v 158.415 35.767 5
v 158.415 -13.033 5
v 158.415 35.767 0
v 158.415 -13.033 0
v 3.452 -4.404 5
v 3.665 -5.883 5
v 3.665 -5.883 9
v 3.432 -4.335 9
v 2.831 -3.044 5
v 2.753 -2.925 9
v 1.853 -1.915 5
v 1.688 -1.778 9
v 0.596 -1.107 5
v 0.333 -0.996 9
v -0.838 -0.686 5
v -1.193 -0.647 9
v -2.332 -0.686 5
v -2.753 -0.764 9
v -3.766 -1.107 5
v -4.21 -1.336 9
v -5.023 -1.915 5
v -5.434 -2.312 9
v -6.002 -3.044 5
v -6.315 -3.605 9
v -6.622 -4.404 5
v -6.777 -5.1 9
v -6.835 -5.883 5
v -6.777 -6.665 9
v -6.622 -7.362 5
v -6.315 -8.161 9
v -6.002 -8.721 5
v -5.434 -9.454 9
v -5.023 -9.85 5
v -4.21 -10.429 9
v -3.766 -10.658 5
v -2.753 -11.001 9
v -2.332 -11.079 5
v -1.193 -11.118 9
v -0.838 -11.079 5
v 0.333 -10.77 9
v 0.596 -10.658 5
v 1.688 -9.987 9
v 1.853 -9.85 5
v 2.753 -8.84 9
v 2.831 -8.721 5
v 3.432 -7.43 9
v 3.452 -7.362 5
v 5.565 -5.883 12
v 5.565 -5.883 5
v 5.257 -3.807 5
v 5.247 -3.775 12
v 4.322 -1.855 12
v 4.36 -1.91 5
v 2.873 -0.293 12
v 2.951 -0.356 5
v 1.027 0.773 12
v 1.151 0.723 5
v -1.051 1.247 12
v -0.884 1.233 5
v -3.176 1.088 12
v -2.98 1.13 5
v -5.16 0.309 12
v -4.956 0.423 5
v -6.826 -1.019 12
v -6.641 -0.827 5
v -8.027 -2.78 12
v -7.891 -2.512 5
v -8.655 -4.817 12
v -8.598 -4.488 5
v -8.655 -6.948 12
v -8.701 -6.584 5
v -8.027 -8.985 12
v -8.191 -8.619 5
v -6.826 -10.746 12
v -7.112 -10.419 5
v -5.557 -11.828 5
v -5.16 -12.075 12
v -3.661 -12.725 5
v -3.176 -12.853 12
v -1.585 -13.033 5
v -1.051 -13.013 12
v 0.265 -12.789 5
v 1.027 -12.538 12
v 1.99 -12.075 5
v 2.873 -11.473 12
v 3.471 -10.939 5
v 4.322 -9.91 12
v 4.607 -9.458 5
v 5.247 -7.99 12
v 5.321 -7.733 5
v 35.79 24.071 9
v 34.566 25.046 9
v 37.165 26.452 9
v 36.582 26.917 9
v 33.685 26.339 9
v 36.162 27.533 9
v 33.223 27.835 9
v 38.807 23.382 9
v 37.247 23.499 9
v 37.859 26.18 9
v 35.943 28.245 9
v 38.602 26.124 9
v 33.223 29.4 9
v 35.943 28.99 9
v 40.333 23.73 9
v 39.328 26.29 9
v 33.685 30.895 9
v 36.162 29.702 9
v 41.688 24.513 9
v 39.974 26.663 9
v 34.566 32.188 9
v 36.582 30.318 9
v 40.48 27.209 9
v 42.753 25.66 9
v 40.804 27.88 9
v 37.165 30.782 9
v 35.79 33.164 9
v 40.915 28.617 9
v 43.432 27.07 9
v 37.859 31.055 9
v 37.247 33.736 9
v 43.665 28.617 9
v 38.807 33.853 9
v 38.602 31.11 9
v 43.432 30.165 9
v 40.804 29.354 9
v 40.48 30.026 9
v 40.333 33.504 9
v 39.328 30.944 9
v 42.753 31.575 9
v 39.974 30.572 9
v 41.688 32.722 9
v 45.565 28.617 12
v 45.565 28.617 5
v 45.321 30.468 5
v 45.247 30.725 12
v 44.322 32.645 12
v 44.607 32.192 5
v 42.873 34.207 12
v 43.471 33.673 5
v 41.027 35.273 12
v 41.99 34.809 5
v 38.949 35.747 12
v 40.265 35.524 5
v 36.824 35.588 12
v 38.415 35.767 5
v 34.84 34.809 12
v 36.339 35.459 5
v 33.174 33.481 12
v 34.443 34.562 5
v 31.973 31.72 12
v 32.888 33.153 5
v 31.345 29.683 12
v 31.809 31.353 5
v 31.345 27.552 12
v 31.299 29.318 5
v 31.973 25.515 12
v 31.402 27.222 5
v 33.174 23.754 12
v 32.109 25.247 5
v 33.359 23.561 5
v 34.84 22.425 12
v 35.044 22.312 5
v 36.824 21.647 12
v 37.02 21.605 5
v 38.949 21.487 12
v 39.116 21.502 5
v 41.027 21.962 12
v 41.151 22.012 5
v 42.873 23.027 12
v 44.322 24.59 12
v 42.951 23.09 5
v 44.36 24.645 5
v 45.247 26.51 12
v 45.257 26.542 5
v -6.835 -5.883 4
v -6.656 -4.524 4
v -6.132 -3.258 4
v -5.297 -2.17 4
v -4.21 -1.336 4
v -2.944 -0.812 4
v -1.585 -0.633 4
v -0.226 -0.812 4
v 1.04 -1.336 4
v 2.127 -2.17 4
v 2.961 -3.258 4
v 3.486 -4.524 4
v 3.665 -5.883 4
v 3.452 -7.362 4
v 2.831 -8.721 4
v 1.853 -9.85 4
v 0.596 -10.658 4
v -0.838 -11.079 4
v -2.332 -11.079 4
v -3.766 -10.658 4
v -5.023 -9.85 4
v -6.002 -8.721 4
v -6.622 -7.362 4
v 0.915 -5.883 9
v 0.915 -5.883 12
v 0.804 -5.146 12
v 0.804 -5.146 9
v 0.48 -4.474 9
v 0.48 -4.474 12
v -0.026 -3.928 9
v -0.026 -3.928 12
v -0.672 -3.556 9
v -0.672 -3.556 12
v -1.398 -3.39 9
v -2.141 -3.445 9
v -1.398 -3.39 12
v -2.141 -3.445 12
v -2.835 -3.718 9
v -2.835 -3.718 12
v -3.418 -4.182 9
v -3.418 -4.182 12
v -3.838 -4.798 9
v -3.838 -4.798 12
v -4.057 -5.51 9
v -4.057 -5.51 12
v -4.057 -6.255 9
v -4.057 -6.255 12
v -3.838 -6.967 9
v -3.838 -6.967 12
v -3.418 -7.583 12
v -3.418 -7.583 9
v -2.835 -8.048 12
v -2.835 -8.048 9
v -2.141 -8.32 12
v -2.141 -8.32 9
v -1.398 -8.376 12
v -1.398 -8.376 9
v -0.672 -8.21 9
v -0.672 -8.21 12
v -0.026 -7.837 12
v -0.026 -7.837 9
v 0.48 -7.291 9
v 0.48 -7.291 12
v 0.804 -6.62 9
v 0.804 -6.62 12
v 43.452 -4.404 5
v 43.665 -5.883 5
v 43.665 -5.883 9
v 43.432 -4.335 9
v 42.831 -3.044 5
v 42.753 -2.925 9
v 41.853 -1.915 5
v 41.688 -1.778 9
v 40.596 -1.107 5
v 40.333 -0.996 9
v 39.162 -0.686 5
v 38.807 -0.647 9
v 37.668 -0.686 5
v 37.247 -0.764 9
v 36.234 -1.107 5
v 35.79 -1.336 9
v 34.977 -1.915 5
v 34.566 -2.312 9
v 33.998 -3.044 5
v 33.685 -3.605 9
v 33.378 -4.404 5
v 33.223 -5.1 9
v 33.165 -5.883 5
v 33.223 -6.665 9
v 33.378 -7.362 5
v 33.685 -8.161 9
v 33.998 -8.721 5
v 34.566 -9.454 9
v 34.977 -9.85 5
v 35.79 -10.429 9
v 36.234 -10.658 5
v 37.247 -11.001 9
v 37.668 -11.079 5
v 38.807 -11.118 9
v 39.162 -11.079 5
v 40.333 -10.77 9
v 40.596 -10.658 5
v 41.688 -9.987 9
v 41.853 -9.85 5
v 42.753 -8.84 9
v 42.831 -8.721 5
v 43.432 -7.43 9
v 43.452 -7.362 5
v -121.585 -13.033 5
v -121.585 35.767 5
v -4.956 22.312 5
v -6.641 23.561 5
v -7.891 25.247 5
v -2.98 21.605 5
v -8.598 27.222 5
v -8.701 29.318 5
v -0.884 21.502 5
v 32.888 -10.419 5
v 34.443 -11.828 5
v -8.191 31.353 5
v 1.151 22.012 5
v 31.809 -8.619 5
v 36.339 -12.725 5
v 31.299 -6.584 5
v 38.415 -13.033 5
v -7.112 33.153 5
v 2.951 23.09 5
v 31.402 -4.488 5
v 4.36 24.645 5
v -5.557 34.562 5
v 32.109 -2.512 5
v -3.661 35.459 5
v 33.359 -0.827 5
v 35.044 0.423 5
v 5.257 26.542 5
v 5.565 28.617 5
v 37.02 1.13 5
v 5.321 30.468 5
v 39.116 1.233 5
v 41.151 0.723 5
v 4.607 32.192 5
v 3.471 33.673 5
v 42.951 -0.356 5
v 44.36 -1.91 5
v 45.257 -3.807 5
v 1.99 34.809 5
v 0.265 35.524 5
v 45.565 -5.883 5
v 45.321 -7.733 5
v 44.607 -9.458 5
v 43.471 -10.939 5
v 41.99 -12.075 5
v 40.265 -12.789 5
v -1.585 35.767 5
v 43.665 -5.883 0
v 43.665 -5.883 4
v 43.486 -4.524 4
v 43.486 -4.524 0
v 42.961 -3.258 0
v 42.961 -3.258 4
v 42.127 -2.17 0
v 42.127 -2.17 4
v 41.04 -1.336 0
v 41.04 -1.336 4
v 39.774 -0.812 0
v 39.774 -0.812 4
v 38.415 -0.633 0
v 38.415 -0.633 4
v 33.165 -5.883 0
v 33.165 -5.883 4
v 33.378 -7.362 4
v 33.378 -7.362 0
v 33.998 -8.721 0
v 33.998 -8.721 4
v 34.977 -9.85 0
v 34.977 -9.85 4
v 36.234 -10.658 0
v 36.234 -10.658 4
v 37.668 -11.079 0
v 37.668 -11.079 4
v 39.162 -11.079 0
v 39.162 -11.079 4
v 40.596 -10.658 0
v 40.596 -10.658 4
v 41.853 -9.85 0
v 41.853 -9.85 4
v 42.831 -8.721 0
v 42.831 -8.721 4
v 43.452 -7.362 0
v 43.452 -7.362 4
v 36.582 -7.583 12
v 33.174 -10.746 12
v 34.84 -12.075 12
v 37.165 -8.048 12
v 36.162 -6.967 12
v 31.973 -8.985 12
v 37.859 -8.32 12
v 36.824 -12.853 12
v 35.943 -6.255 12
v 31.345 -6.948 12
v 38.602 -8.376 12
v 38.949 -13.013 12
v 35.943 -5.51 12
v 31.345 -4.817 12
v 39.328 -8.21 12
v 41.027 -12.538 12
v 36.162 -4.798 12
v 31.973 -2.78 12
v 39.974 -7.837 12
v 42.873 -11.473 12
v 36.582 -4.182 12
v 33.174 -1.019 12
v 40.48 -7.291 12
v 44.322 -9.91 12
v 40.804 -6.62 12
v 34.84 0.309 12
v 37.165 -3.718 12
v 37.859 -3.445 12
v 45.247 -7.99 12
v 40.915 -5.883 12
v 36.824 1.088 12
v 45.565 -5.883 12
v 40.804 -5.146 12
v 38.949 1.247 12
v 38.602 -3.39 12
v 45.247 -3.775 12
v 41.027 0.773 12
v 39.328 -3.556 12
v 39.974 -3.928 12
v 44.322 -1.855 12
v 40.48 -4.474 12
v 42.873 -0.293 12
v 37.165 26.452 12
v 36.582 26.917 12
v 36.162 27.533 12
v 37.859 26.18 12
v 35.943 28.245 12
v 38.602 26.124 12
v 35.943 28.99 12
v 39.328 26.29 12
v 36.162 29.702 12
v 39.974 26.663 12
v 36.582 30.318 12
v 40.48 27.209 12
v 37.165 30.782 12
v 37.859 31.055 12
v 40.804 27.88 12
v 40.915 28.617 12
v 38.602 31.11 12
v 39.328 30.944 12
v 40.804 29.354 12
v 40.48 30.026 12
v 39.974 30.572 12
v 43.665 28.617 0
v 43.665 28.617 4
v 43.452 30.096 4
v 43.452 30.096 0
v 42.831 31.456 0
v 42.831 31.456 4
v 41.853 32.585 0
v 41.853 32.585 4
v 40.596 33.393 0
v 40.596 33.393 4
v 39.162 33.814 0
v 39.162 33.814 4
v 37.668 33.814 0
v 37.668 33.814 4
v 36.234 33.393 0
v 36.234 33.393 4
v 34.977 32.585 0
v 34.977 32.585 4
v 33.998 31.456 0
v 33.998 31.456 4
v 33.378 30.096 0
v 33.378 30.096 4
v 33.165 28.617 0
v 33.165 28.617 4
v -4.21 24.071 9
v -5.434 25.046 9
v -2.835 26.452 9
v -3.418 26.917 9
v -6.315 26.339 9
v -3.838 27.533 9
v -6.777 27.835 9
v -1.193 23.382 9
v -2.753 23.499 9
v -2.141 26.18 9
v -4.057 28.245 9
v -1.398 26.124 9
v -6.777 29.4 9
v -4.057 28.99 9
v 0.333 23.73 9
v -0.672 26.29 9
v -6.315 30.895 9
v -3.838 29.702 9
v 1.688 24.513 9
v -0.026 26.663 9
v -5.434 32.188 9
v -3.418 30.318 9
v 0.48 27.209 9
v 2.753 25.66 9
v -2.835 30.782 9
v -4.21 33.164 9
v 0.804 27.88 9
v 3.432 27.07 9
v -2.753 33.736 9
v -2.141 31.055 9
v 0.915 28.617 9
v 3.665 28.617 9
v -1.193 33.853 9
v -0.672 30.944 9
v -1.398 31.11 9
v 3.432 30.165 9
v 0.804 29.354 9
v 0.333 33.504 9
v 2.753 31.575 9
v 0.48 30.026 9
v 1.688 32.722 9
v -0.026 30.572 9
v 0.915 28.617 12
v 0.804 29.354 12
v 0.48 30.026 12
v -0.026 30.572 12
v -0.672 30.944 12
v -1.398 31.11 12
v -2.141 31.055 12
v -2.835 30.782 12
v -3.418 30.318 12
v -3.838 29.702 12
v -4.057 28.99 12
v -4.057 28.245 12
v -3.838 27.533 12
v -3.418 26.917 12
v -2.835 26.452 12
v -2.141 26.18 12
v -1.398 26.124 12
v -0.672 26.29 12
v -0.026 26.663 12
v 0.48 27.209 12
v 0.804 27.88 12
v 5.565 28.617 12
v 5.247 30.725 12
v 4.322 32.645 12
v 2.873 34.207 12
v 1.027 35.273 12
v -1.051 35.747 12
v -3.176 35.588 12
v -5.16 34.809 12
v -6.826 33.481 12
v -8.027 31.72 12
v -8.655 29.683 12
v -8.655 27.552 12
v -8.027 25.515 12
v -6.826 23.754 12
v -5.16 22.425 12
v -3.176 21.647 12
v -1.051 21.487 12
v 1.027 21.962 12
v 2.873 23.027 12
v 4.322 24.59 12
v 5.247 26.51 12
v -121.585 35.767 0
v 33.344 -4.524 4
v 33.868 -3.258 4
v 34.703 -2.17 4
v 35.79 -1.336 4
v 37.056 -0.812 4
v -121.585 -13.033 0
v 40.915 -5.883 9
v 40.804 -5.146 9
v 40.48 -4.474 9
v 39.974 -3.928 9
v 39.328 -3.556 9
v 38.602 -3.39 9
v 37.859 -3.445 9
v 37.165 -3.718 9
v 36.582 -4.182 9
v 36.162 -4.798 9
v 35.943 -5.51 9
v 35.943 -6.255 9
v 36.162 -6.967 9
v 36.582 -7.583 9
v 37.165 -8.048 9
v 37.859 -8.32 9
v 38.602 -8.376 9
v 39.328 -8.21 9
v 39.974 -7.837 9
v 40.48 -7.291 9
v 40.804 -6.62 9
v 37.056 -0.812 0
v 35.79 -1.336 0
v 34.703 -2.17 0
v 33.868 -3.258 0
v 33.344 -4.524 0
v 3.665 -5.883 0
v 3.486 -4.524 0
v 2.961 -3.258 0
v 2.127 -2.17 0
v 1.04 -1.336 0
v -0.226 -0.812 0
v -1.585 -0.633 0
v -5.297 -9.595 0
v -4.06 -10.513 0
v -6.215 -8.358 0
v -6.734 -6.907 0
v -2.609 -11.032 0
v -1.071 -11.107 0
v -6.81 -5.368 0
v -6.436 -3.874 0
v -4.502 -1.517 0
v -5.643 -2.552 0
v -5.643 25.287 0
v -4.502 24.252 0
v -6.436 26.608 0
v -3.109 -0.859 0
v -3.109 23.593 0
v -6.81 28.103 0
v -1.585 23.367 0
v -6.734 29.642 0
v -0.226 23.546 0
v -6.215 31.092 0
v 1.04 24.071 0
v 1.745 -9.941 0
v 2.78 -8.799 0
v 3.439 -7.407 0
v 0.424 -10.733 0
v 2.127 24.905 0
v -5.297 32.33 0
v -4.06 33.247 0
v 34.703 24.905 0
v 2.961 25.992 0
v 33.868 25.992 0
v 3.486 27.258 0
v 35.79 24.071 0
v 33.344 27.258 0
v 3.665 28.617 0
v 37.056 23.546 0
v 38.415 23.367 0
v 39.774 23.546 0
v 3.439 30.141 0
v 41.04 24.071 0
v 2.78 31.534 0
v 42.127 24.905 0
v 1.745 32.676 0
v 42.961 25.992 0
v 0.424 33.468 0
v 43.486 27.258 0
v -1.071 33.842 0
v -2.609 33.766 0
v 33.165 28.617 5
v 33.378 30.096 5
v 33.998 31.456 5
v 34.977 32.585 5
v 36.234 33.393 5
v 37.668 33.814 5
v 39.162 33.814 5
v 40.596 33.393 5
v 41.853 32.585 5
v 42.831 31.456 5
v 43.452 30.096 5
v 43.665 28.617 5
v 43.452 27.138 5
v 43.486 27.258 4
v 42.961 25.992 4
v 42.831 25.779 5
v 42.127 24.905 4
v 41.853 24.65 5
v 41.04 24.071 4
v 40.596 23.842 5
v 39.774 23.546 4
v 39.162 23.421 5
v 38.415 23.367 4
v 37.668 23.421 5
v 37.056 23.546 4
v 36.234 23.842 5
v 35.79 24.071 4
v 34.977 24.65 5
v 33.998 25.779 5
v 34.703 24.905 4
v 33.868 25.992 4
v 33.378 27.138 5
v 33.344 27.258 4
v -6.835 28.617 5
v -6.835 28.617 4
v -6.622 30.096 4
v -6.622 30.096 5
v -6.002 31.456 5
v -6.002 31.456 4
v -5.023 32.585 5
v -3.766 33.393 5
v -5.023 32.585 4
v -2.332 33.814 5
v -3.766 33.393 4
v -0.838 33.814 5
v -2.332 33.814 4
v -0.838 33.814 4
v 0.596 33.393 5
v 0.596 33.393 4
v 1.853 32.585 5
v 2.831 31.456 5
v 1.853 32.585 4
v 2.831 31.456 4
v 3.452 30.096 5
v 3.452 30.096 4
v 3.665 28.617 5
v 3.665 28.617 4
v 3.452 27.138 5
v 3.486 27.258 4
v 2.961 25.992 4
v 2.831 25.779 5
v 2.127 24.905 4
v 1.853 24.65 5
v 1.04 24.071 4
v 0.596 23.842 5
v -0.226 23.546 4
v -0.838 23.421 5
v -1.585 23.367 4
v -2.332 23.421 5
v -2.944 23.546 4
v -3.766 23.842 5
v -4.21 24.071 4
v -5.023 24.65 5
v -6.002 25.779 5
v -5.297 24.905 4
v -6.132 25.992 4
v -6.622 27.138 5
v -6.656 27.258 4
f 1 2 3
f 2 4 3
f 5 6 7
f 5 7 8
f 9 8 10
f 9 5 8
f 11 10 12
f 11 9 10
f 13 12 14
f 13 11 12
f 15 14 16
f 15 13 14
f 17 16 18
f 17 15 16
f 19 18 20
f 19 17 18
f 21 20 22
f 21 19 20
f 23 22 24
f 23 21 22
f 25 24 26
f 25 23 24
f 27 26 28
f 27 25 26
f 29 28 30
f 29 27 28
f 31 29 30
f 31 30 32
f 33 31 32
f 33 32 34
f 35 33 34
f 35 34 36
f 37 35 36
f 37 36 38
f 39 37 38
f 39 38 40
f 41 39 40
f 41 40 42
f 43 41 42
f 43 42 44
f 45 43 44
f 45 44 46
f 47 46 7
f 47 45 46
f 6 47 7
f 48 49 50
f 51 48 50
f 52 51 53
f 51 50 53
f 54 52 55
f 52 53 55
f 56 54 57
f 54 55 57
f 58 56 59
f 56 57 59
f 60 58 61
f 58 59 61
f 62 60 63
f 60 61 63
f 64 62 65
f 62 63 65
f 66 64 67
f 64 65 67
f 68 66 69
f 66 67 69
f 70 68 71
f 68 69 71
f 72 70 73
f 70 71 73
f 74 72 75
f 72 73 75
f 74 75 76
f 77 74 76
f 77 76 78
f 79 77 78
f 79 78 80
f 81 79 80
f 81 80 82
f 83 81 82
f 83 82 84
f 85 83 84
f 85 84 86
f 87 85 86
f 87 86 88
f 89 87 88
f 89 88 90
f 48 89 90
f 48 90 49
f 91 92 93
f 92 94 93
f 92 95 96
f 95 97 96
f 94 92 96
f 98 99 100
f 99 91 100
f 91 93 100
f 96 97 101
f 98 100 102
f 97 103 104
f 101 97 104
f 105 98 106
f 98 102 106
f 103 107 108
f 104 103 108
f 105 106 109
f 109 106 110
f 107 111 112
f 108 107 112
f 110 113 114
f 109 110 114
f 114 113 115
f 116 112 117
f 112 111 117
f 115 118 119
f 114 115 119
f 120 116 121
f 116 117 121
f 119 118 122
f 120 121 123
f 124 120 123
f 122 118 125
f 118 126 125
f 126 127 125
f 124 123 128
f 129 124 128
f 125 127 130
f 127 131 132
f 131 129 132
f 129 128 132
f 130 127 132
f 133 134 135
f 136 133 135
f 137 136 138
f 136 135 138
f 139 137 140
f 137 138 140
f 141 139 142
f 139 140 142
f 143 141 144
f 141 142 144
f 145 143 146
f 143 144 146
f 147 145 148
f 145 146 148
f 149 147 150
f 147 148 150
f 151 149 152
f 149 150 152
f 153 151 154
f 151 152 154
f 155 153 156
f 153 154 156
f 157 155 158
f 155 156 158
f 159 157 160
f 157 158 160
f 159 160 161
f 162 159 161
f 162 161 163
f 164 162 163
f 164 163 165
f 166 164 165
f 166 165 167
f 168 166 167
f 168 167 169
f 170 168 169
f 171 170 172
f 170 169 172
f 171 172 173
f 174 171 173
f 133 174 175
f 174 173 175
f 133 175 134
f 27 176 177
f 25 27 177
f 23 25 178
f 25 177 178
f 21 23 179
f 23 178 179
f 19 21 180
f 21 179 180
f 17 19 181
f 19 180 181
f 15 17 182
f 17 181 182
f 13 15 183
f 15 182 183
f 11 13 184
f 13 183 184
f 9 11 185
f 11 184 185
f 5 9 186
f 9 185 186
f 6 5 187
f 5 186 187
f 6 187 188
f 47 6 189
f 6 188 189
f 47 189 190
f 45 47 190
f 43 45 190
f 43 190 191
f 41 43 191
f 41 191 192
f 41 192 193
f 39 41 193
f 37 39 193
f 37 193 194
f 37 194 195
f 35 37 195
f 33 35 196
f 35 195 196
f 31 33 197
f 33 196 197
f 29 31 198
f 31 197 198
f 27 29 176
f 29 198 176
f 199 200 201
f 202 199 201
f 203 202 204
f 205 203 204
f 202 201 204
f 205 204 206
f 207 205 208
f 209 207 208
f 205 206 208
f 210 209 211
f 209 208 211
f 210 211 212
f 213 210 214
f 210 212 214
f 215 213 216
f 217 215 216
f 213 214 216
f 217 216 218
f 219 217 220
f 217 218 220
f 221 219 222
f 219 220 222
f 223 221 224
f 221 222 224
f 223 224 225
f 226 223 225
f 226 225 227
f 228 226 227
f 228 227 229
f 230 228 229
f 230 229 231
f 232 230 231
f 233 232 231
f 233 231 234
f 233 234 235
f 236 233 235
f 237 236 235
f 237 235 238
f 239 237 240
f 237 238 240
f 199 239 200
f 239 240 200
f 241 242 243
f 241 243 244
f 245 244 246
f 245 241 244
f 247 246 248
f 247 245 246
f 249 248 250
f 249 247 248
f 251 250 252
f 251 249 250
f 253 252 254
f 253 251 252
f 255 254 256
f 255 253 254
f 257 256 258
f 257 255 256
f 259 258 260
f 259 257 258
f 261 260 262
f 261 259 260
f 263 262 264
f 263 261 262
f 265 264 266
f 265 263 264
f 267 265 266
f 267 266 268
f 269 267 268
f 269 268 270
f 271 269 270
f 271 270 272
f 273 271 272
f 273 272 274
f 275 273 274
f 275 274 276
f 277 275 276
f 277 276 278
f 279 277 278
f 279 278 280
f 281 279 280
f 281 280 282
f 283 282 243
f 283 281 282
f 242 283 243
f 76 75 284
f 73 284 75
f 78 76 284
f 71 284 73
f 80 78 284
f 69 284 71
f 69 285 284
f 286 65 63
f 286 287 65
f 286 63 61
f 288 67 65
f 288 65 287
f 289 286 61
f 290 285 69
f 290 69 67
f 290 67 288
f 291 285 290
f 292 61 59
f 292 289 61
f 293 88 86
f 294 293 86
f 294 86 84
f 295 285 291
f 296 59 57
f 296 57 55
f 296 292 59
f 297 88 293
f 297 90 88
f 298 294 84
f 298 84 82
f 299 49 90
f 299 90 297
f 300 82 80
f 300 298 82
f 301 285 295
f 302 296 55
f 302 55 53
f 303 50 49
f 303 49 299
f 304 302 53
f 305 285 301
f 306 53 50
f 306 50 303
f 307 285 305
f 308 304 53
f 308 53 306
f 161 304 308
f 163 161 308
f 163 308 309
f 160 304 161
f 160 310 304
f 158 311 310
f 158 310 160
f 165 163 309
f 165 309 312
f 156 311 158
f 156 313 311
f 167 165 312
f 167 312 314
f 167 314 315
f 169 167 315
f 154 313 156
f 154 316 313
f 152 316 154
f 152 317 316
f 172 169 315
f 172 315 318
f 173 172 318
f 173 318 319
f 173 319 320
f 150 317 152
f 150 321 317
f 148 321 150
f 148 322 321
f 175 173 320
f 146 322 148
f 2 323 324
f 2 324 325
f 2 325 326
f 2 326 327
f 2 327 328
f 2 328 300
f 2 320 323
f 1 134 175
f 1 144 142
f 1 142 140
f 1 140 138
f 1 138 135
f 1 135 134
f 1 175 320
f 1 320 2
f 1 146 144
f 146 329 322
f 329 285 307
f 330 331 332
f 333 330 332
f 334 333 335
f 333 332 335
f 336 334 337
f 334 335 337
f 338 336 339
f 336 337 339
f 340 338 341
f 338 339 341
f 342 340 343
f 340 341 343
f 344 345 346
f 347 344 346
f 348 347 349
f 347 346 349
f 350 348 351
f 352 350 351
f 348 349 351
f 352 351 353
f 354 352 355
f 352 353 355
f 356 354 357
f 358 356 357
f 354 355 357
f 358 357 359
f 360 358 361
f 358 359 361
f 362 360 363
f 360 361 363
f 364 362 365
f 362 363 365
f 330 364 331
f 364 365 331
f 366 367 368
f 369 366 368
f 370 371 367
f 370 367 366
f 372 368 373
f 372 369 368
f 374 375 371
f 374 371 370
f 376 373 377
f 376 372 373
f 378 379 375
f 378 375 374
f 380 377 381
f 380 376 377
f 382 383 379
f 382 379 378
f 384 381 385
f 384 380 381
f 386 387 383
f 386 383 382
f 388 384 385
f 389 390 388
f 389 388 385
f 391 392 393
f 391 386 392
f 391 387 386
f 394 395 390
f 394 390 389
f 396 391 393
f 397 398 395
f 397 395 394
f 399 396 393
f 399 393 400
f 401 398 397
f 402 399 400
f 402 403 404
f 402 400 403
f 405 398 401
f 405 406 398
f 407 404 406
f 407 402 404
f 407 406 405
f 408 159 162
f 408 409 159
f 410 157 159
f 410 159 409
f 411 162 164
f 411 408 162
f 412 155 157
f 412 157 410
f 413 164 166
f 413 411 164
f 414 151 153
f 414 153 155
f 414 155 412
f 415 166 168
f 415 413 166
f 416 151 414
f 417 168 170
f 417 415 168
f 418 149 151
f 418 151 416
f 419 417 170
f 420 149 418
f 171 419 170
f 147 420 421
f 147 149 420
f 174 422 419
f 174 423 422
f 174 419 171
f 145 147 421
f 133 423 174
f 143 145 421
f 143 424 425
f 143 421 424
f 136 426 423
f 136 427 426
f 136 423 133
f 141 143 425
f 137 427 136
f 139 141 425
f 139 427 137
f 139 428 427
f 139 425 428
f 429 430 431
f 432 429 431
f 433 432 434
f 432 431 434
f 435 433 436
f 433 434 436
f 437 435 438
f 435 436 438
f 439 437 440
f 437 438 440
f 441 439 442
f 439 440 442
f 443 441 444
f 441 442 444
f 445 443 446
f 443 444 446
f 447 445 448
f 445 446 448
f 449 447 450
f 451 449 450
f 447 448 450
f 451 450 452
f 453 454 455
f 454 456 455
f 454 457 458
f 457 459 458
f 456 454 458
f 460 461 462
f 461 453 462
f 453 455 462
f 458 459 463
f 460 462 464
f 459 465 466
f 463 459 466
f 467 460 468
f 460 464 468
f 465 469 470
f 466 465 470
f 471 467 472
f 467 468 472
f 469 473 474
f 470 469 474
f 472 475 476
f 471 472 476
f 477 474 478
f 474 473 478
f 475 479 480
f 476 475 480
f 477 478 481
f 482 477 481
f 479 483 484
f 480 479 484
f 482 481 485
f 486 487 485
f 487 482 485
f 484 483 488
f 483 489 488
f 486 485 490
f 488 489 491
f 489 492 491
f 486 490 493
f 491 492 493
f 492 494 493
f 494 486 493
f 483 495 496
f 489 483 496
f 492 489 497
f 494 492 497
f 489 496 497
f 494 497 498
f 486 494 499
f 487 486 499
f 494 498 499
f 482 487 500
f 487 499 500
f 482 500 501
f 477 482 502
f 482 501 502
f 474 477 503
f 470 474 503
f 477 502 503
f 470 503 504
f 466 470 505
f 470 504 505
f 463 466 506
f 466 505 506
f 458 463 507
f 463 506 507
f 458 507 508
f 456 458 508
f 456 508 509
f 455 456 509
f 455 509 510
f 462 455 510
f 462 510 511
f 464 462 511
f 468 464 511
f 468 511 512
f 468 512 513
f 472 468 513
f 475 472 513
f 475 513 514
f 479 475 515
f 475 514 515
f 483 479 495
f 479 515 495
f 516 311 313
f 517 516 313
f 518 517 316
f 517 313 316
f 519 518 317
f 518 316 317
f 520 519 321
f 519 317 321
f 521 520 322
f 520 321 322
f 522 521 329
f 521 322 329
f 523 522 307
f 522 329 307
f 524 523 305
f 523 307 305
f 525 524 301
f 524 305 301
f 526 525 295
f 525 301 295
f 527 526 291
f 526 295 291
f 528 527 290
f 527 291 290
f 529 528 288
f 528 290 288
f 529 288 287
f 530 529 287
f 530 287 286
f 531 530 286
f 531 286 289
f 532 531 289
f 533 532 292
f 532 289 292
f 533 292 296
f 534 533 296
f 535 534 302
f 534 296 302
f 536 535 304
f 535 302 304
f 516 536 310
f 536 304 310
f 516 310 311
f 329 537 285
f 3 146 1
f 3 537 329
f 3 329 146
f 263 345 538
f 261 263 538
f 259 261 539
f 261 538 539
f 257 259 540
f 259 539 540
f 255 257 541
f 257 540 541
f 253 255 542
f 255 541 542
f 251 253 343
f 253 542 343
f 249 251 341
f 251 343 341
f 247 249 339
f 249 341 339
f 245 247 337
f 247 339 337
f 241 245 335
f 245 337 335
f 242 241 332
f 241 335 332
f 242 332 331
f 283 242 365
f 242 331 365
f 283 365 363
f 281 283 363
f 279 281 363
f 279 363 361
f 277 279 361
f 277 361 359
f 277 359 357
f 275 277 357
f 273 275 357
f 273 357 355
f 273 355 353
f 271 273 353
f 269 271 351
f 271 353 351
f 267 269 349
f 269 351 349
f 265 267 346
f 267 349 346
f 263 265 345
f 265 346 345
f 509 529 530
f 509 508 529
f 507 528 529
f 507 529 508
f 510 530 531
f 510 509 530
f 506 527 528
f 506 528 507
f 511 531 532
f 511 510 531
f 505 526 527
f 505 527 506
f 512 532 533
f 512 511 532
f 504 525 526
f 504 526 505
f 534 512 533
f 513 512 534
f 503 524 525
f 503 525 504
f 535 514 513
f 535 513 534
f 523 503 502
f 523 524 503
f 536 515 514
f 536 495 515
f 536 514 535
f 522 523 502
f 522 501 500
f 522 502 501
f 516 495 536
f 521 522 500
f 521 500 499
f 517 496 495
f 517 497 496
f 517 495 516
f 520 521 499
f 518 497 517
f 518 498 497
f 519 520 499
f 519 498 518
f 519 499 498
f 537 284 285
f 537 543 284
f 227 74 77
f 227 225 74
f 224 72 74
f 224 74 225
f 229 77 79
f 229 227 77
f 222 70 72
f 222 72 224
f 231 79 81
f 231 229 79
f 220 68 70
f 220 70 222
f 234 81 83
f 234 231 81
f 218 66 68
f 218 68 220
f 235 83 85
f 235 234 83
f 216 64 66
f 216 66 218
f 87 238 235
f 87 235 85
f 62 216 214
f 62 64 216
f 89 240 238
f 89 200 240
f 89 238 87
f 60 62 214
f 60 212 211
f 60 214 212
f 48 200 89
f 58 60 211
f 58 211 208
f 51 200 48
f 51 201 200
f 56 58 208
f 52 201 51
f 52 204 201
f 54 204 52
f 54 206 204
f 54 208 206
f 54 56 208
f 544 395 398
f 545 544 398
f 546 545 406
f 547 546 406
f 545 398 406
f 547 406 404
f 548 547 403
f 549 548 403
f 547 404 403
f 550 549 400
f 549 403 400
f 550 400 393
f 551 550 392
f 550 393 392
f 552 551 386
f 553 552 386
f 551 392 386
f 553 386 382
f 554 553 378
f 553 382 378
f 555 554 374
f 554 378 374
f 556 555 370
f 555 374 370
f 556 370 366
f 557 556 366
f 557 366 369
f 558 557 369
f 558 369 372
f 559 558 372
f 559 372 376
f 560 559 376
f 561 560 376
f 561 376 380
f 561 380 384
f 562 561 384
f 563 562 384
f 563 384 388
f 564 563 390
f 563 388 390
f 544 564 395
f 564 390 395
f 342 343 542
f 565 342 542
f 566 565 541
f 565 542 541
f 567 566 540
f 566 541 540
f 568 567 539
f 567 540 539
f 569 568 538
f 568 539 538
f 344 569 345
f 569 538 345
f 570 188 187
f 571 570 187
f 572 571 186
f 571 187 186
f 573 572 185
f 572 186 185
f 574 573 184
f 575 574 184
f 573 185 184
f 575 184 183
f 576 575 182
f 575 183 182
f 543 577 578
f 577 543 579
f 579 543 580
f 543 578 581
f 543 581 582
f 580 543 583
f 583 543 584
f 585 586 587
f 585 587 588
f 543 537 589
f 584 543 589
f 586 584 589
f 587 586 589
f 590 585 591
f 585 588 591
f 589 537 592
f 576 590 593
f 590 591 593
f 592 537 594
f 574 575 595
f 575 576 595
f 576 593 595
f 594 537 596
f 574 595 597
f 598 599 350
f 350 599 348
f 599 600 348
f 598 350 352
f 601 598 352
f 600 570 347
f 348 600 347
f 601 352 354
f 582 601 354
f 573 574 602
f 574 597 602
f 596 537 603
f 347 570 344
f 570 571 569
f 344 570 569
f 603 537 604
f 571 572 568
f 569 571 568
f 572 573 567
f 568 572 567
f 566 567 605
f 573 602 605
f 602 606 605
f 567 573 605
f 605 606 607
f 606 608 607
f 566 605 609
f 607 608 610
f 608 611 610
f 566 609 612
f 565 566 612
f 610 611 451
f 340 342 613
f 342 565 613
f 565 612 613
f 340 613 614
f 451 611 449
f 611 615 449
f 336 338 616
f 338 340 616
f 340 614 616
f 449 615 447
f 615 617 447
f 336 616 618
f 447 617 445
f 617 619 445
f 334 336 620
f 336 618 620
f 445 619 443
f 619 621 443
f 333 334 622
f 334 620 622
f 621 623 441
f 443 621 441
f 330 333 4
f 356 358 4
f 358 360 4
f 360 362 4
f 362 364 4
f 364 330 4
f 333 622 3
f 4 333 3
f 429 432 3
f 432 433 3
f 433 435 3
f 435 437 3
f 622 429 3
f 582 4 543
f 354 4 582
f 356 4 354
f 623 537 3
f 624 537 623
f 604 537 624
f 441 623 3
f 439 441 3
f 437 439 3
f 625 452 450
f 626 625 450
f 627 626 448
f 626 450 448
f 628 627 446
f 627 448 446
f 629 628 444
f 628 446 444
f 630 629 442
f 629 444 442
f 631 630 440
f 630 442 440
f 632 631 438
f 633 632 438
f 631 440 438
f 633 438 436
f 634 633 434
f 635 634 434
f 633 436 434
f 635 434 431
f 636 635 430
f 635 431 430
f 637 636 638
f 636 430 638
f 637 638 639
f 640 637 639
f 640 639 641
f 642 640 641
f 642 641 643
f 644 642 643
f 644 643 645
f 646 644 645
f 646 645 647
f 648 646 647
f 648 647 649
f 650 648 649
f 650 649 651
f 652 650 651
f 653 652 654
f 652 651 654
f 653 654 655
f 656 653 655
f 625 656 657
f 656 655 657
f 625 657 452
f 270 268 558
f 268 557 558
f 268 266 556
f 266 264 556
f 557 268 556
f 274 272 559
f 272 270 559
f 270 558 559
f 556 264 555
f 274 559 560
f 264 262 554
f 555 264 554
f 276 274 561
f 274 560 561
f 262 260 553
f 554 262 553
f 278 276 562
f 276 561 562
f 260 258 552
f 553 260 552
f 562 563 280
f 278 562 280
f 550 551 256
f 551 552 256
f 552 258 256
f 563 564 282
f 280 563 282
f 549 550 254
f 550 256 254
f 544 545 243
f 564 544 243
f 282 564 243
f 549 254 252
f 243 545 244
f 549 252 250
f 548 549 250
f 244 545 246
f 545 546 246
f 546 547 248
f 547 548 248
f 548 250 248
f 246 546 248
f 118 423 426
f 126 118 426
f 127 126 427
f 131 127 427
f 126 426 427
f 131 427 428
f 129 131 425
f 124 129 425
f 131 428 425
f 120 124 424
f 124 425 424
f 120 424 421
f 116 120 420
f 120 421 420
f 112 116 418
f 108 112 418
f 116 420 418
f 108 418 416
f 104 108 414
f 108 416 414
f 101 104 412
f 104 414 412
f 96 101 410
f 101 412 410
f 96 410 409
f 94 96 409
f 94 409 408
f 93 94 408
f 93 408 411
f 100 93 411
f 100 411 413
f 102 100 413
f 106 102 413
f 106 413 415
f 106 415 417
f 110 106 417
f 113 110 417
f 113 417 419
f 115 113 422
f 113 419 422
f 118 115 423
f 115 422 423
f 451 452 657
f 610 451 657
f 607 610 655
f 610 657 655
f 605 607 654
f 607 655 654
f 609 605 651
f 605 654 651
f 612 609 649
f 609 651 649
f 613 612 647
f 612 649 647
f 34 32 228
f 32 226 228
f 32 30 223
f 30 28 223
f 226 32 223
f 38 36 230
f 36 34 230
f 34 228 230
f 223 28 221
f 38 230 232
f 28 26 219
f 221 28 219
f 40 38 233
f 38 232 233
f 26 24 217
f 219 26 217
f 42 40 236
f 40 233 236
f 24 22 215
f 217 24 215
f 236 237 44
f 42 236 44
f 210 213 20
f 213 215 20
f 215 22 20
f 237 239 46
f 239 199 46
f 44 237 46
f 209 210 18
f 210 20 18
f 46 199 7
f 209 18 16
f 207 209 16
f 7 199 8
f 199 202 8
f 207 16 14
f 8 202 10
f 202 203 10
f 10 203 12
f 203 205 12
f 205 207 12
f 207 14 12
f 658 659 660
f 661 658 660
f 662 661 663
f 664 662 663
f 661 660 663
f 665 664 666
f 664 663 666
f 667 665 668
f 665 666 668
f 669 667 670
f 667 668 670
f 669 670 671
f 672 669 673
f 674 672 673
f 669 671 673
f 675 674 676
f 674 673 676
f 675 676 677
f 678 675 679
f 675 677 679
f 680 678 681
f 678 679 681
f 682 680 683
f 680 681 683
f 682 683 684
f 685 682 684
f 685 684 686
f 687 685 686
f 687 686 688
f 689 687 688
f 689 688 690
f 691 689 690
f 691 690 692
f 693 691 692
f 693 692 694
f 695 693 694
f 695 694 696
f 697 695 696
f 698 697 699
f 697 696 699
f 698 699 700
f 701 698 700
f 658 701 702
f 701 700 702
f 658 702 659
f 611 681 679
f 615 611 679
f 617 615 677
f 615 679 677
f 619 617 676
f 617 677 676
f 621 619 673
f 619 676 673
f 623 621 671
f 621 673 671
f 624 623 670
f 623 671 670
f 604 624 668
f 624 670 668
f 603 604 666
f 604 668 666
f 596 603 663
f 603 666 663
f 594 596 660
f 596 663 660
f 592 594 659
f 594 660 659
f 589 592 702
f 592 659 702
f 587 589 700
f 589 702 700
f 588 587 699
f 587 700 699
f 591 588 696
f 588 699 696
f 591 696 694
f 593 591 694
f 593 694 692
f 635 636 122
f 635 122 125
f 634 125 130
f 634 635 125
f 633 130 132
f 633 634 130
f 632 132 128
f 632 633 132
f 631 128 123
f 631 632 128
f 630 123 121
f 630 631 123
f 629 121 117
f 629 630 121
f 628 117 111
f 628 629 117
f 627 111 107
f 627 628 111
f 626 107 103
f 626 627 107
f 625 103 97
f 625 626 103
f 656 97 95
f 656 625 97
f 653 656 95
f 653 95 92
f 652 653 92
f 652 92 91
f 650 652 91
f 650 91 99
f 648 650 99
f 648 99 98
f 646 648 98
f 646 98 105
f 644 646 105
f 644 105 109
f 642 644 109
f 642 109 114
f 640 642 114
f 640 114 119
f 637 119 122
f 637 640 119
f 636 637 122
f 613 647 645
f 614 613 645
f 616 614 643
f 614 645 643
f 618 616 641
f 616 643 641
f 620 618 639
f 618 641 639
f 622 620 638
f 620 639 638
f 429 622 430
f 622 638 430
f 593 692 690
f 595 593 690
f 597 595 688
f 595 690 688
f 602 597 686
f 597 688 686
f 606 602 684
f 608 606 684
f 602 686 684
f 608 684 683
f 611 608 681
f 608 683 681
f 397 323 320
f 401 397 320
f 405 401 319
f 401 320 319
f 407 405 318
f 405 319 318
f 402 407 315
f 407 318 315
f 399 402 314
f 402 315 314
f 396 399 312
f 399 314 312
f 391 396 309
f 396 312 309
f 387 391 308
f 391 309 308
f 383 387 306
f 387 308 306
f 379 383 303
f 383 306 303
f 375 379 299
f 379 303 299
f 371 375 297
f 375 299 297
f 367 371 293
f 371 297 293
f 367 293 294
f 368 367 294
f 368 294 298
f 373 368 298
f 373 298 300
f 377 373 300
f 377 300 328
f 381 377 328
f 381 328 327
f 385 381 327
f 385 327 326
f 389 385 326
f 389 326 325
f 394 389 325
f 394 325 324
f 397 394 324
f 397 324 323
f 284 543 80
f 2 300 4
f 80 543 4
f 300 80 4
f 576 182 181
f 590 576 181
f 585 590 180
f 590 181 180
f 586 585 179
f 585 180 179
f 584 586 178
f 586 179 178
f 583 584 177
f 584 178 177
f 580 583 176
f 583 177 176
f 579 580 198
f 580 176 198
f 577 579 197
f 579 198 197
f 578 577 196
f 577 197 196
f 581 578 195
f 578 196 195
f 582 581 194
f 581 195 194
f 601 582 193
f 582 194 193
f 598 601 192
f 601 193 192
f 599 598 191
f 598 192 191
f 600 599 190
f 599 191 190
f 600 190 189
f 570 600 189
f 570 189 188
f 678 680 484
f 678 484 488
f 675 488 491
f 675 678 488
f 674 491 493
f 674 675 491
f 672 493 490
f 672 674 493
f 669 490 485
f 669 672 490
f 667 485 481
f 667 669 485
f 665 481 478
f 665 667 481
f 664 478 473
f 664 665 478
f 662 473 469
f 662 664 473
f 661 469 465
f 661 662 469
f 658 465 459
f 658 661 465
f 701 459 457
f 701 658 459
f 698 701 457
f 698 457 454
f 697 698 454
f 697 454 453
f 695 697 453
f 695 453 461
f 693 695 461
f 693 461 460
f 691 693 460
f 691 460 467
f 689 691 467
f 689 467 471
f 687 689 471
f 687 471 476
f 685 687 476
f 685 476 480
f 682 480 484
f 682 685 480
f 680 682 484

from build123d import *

# Parameters (mm, degrees)
SKETCH1_W           = 280
SKETCH1_H           = 48.8
BOSS_EXTRUDE1_DEPTH = 4
CUT_EXTRUDE1_DEPTH  = 5
SKETCH3_R           = 7.15
SKETCH3_R_2         = 5.25
BOSS_EXTRUDE2_DEPTH = 8
SKETCH4_R           = 7.15
SKETCH4_R_2         = 2.5
BOSS_EXTRUDE3_DEPTH = 3
SKETCH5_W           = 280
SKETCH5_H           = 48.8
BOSS_EXTRUDE6_DEPTH = 1
SKETCH6_R           = 5.25
CUT_EXTRUDE2_DEPTH  = 1


with BuildPart() as part:
    # Sketch1 → Boss-Extrude1 (new body)
    with BuildSketch(Plane.XY):
        with Locations((18.41484, 11.367285)):
            Rectangle(SKETCH1_W, SKETCH1_H)
    extrude(amount=BOSS_EXTRUDE1_DEPTH)

    # Sketch2 → Cut-Extrude1 (cut, through all)
    with BuildSketch(Plane.XY.offset(4)):
        with BuildLine():
            Line((-1.58516, 23.367285), (-1.58516, 28.617285))
            Line((-1.58516, 28.617285), (3.66484, 28.617285))
            ThreePointArc((3.66484, 28.617285), (-5.297471, 32.329596), (-1.58516, 23.367285))
        make_face()
        with BuildLine():
            Line((3.66484, 28.617285), (-1.58516, 28.617285))
            Line((-1.58516, 28.617285), (-1.58516, 23.367285))
            ThreePointArc((-1.58516, 23.367285), (2.12715, 24.904974), (3.66484, 28.617285))
        make_face()
        with BuildLine():
            ThreePointArc((3.66484, -5.882715), (2.12715, -2.170404), (-1.58516, -0.632715))
            Line((-1.58516, -0.632715), (-1.58516, -5.882715))
            Line((-1.58516, -5.882715), (3.66484, -5.882715))
        make_face()
        with BuildLine():
            Line((-1.58516, -5.882715), (-1.58516, -0.632715))
            ThreePointArc((-1.58516, -0.632715), (-5.297471, -9.595026), (3.66484, -5.882715))
            Line((3.66484, -5.882715), (-1.58516, -5.882715))
        make_face()
        with BuildLine():
            ThreePointArc((43.66484, -5.882715), (42.12715, -2.170404), (38.41484, -0.632715))
            Line((38.41484, -0.632715), (38.41484, -5.882715))
            Line((38.41484, -5.882715), (33.16484, -5.882715))
            ThreePointArc((33.16484, -5.882715), (38.41484, -11.132715), (43.66484, -5.882715))
        make_face()
        with BuildLine():
            Line((38.41484, -5.882715), (38.41484, -0.632715))
            ThreePointArc((38.41484, -0.632715), (34.702529, -2.170404), (33.16484, -5.882715))
            Line((33.16484, -5.882715), (38.41484, -5.882715))
        make_face()
        with BuildLine():
            ThreePointArc((43.66484, 28.617285), (38.41484, 33.867285), (33.16484, 28.617285))
            Line((33.16484, 28.617285), (38.41484, 28.617285))
            Line((38.41484, 28.617285), (38.41484, 23.367285))
            ThreePointArc((38.41484, 23.367285), (42.12715, 24.904974), (43.66484, 28.617285))
        make_face()
        with BuildLine():
            Line((38.41484, 28.617285), (33.16484, 28.617285))
            ThreePointArc((33.16484, 28.617285), (34.702529, 24.904974), (38.41484, 23.367285))
            Line((38.41484, 23.367285), (38.41484, 28.617285))
        make_face()
    extrude(amount=-CUT_EXTRUDE1_DEPTH, mode=Mode.SUBTRACT)

    # Sketch3 → Boss-Extrude2 (add)
    with BuildSketch(Plane.XY.offset(4)):
        with Locations((-1.58516, 28.617285)):
            Circle(SKETCH3_R)
        with Locations((-1.58516, 28.617285)):
            Circle(SKETCH3_R_2, mode=Mode.SUBTRACT)
        with Locations((38.41484, 28.617285)):
            Circle(SKETCH3_R)
        with Locations((38.41484, 28.617285)):
            Circle(SKETCH3_R_2, mode=Mode.SUBTRACT)
        with Locations((-1.58516, -5.882715)):
            Circle(SKETCH3_R)
        with Locations((-1.58516, -5.882715)):
            Circle(SKETCH3_R_2, mode=Mode.SUBTRACT)
        with Locations((38.41484, -5.882715)):
            Circle(SKETCH3_R)
        with Locations((38.41484, -5.882715)):
            Circle(SKETCH3_R_2, mode=Mode.SUBTRACT)
    extrude(amount=BOSS_EXTRUDE2_DEPTH)

    # Sketch4 → Boss-Extrude3 (add)
    with BuildSketch(Plane.XY.offset(12)):
        with Locations((-1.58516, 28.617285)):
            Circle(SKETCH4_R)
        with Locations((-1.58516, 28.617285)):
            Circle(SKETCH4_R_2, mode=Mode.SUBTRACT)
        with Locations((38.41484, 28.617285)):
            Circle(SKETCH4_R)
        with Locations((38.41484, 28.617285)):
            Circle(SKETCH4_R_2, mode=Mode.SUBTRACT)
        with Locations((-1.58516, -5.882715)):
            Circle(SKETCH4_R)
        with Locations((-1.58516, -5.882715)):
            Circle(SKETCH4_R_2, mode=Mode.SUBTRACT)
        with Locations((38.41484, -5.882715)):
            Circle(SKETCH4_R)
        with Locations((38.41484, -5.882715)):
            Circle(SKETCH4_R_2, mode=Mode.SUBTRACT)
    extrude(amount=-BOSS_EXTRUDE3_DEPTH)

    # Sketch5 → Boss-Extrude6 (add)
    with BuildSketch(Plane.XY.offset(4)):
        with Locations((18.41484, 11.367285)):
            Rectangle(SKETCH5_W, SKETCH5_H)
    extrude(amount=BOSS_EXTRUDE6_DEPTH)

    # Sketch6 → Cut-Extrude2 (cut)
    with BuildSketch(Plane(origin=(0, 0, 4), x_dir=(-1, 0, 0), z_dir=(0, 0, -1))):
        with Locations((-38.41484, 28.617285)):
            Circle(SKETCH6_R)
        with Locations((1.58516, 28.617285)):
            Circle(SKETCH6_R)
        with Locations((1.58516, -5.882715)):
            Circle(SKETCH6_R)
        with Locations((-38.41484, -5.882715)):
            Circle(SKETCH6_R)
    extrude(amount=-CUT_EXTRUDE2_DEPTH, mode=Mode.SUBTRACT)


solid = part.part
